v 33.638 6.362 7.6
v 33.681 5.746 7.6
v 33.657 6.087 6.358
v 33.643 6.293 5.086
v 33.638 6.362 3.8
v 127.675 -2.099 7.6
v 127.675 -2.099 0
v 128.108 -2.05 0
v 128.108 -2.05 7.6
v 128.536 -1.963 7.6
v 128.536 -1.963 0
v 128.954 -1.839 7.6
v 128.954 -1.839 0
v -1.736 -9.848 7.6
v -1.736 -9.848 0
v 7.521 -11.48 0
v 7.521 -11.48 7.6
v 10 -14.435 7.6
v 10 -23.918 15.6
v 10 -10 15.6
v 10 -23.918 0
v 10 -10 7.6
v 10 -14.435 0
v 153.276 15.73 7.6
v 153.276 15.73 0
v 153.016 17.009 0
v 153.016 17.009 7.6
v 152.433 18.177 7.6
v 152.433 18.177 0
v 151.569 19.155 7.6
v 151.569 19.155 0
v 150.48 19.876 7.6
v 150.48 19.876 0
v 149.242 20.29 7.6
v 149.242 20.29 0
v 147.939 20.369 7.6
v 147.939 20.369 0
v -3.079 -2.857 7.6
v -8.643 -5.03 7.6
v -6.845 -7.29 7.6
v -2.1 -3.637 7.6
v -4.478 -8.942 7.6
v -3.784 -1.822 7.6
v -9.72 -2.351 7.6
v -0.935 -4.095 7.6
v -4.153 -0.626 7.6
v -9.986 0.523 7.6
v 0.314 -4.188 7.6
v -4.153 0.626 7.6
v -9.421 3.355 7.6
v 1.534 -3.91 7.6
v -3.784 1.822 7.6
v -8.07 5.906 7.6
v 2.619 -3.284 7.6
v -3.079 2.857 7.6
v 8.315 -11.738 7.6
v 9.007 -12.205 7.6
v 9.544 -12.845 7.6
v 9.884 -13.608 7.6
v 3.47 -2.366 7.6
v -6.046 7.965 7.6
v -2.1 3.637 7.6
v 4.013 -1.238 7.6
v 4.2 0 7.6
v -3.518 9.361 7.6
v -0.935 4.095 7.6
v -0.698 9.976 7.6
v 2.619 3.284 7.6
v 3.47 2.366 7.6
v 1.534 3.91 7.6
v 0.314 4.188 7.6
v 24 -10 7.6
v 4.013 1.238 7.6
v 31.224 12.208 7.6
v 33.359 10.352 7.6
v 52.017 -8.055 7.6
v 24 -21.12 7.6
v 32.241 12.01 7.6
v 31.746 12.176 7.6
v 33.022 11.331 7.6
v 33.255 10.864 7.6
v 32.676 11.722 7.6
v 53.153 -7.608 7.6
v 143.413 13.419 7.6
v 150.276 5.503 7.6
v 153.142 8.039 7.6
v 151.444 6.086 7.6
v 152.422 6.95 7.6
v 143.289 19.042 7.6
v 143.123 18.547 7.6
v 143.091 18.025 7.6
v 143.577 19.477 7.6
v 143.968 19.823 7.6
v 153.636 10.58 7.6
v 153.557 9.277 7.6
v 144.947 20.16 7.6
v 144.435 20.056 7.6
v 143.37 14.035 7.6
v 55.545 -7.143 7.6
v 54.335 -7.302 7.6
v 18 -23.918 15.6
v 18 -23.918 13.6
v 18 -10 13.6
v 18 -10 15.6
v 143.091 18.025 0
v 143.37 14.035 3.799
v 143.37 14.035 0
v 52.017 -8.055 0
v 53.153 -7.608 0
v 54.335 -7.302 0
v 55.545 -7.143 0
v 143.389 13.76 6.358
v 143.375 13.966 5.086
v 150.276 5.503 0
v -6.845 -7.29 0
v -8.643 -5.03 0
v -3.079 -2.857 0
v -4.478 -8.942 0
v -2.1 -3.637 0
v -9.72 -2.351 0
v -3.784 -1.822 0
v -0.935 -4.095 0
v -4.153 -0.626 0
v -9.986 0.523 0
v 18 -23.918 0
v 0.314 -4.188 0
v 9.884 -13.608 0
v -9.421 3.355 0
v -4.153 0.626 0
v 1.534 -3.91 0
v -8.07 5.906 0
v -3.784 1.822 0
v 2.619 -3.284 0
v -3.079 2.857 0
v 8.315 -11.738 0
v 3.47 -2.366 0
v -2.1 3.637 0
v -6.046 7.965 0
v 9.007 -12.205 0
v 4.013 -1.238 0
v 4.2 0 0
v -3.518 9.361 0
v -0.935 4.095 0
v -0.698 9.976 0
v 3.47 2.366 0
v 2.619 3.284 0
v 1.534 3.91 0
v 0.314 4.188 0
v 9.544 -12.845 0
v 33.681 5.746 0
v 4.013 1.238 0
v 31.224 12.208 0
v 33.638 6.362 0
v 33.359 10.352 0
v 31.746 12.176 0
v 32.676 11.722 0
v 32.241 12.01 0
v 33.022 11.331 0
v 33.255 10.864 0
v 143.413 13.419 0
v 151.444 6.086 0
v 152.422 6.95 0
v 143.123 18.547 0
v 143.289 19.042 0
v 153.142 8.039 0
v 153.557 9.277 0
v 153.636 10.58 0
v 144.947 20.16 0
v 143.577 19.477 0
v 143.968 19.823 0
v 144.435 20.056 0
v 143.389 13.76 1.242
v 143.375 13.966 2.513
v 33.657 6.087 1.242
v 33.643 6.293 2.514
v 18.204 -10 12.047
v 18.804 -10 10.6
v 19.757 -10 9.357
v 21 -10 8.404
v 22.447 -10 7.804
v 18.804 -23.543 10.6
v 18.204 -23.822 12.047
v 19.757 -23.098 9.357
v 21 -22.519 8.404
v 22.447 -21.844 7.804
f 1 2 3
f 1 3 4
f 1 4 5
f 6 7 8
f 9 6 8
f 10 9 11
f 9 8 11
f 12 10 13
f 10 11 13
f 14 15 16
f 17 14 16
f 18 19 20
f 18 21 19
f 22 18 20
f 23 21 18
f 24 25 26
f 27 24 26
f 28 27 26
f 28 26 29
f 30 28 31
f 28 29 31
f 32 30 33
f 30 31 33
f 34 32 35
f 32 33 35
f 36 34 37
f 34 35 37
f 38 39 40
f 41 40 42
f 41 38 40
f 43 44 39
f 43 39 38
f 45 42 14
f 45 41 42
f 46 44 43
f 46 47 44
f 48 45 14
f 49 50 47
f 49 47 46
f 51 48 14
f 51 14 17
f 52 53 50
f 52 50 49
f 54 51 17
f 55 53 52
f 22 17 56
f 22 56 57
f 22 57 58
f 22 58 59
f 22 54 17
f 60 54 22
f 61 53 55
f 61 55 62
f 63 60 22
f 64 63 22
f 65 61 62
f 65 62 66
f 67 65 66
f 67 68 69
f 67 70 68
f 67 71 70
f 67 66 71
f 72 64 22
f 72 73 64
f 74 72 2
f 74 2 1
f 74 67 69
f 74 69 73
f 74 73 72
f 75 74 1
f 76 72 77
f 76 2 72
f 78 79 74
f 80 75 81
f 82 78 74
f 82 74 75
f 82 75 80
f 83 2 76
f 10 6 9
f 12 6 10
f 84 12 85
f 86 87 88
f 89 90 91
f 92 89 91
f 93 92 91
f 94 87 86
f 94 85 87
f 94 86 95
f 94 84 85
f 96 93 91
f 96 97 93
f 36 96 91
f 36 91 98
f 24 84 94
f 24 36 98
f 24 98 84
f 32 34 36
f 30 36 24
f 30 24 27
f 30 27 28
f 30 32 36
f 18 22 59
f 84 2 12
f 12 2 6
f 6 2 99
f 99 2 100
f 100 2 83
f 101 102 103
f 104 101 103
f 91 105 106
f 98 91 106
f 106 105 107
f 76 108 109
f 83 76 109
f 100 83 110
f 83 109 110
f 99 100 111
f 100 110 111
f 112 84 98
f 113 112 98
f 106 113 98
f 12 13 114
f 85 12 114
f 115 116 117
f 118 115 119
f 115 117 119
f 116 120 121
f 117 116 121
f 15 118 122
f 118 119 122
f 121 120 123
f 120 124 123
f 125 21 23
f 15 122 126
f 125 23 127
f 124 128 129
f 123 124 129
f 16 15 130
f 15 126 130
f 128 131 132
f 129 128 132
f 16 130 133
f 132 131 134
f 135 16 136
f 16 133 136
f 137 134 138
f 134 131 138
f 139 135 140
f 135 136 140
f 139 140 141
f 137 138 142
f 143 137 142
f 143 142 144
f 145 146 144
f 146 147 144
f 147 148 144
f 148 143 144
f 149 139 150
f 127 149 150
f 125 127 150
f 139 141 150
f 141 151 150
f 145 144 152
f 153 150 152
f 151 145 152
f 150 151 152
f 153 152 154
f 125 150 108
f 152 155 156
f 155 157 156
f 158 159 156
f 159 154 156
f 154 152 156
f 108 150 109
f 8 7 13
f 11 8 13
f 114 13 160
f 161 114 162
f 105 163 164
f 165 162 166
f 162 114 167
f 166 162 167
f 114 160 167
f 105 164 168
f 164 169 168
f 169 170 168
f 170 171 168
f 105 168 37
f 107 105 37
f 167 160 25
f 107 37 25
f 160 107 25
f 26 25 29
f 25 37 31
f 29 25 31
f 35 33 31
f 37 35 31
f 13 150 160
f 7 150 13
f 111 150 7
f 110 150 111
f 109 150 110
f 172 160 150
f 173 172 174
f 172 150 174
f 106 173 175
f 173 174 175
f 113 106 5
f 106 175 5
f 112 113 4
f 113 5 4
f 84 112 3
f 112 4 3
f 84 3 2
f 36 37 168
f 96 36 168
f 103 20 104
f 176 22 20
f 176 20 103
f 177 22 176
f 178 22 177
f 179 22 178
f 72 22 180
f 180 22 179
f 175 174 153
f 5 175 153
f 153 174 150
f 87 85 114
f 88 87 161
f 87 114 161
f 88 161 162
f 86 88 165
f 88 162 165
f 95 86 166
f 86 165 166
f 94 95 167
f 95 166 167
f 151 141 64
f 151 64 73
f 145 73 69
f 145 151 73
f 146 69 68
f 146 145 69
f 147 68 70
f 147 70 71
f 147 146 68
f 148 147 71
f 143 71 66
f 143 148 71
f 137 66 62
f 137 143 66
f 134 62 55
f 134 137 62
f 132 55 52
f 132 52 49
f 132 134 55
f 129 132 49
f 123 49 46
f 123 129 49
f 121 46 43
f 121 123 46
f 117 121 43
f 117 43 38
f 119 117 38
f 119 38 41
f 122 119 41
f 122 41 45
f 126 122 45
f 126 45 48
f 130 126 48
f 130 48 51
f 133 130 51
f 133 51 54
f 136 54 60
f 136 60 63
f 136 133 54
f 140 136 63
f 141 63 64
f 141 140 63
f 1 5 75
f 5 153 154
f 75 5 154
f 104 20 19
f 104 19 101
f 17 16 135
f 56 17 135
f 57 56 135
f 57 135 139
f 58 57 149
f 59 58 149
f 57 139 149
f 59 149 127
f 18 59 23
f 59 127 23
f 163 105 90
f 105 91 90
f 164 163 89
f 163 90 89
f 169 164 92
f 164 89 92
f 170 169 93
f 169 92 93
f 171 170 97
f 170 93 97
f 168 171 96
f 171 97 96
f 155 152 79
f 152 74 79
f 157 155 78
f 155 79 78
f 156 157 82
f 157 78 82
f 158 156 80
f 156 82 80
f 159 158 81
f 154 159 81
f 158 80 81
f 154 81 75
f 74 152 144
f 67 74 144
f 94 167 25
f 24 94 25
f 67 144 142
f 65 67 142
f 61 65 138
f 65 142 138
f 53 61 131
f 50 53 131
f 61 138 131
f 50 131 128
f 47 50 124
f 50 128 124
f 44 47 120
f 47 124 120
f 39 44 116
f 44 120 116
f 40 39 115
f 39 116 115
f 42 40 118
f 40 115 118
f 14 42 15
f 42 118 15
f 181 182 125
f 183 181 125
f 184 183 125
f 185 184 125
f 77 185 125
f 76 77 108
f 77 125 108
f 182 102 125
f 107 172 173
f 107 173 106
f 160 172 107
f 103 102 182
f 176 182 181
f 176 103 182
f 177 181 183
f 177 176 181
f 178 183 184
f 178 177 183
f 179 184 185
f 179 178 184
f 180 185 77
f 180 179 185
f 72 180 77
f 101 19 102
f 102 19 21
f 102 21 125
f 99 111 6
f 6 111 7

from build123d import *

# Parameters (mm, degrees)
SKETCH1_R           = 4.2
BOSS_EXTRUDE1_DEPTH = 7.6
SKETCH2_W           = 8
SKETCH2_H           = 13.917535926
BOSS_EXTRUDE2_DEPTH = 8
FILLET1_R           = 6
CUT_EXTRUDE2_DEPTH  = 110
FILLET2_R           = 2


with BuildPart() as part:
    # Sketch1 → Boss-Extrude1 (new body)
    with BuildSketch(Plane.XY):
        with BuildLine():
            Line((-1.736481777, -9.84807753), (7.520944533, -11.48041156))
            ThreePointArc((7.520944533, -11.48041156), (9.298133329, -12.50647199), (10, -14.434834819))
            Line((10, -14.434834819), (10, -23.917535926))
            Line((10, -23.917535926), (18, -23.917535926))
            Line((18, -23.917535926), (52.016628597, -8.055321506))
            ThreePointArc((52.016628597, -8.055321506), (53.739011174, -7.436922973), (55.545246477, -7.142758874))
            Line((55.545246477, -7.142758874), (127.674807922, -2.098968595))
            ThreePointArc((127.674807922, -2.098968595), (128.322865225, -2.010771867), (128.953866326, -1.838741222))
            Line((128.953866326, -1.838741222), (150.276280032, 5.503154599))
            ThreePointArc((150.276280032, 5.503154599), (152.81786837, 7.47106255), (153.636259511, 10.579529846))
            Line((153.636259511, 10.579529846), (153.276081371, 15.730317208))
            ThreePointArc((153.276081371, 15.730317208), (151.568556265, 19.15508274), (147.939478751, 20.36935509))
            Line((147.939478751, 20.36935509), (142.9516585, 20.020572722))
            Line((142.9516585, 20.020572722), (143.370197342, 14.03518842))
            Line((143.370197342, 14.03518842), (33.638151814, 6.361976308))
            Line((33.638151814, 6.361976308), (33.219612971, 12.34736061))
            Line((33.219612971, 12.34736061), (-0.697564737, 9.975640503))
            ThreePointArc((-0.697564737, 9.975640503), (-9.986295348, 0.523359562), (-1.736481777, -9.84807753))
        make_face()
        Circle(SKETCH1_R, mode=Mode.SUBTRACT)
    extrude(amount=BOSS_EXTRUDE1_DEPTH)

    # Sketch2 → Boss-Extrude2 (add)
    with BuildSketch(Plane.XY.offset(7.6)):
        with Locations((14, -16.958767963)):
            Rectangle(SKETCH2_W, SKETCH2_H)
    extrude(amount=BOSS_EXTRUDE2_DEPTH)

    # Fillet1
    fillet1_edges = [part.edges().sort_by_distance(p)[0] for p in [
        (18, -16.958767963, 7.6),
    ]]
    fillet(fillet1_edges, radius=FILLET1_R)

    # Sketch6 → Cut-Extrude2 (cut)
    with BuildSketch(Plane(origin=(22.512095066, 165.472000606, 0), x_dir=(0, 0, -1), z_dir=(-0.99756405, -0.069756474, 0))):
        with BuildLine():
            Line((-7.6, 160.116112141), (-7.6, 153.498554761))
            Line((-7.6, 153.498554761), (0, 153.498554761))
            Line((0, 153.498554761), (0, 160.116112141))
            ThreePointArc((0, 160.116112141), (-3.8, 159.498554761), (-7.6, 160.116112141))
        make_face()
    extrude(amount=-CUT_EXTRUDE2_DEPTH, mode=Mode.SUBTRACT)

    # Fillet2
    fillet2_edges = [part.edges().sort_by_distance(p)[0] for p in [
        (33.219612971, 12.34736061, 3.8),
        (142.9516585, 20.020572722, 3.8),
    ]]
    fillet(fillet2_edges, radius=FILLET2_R)


solid = part.part
